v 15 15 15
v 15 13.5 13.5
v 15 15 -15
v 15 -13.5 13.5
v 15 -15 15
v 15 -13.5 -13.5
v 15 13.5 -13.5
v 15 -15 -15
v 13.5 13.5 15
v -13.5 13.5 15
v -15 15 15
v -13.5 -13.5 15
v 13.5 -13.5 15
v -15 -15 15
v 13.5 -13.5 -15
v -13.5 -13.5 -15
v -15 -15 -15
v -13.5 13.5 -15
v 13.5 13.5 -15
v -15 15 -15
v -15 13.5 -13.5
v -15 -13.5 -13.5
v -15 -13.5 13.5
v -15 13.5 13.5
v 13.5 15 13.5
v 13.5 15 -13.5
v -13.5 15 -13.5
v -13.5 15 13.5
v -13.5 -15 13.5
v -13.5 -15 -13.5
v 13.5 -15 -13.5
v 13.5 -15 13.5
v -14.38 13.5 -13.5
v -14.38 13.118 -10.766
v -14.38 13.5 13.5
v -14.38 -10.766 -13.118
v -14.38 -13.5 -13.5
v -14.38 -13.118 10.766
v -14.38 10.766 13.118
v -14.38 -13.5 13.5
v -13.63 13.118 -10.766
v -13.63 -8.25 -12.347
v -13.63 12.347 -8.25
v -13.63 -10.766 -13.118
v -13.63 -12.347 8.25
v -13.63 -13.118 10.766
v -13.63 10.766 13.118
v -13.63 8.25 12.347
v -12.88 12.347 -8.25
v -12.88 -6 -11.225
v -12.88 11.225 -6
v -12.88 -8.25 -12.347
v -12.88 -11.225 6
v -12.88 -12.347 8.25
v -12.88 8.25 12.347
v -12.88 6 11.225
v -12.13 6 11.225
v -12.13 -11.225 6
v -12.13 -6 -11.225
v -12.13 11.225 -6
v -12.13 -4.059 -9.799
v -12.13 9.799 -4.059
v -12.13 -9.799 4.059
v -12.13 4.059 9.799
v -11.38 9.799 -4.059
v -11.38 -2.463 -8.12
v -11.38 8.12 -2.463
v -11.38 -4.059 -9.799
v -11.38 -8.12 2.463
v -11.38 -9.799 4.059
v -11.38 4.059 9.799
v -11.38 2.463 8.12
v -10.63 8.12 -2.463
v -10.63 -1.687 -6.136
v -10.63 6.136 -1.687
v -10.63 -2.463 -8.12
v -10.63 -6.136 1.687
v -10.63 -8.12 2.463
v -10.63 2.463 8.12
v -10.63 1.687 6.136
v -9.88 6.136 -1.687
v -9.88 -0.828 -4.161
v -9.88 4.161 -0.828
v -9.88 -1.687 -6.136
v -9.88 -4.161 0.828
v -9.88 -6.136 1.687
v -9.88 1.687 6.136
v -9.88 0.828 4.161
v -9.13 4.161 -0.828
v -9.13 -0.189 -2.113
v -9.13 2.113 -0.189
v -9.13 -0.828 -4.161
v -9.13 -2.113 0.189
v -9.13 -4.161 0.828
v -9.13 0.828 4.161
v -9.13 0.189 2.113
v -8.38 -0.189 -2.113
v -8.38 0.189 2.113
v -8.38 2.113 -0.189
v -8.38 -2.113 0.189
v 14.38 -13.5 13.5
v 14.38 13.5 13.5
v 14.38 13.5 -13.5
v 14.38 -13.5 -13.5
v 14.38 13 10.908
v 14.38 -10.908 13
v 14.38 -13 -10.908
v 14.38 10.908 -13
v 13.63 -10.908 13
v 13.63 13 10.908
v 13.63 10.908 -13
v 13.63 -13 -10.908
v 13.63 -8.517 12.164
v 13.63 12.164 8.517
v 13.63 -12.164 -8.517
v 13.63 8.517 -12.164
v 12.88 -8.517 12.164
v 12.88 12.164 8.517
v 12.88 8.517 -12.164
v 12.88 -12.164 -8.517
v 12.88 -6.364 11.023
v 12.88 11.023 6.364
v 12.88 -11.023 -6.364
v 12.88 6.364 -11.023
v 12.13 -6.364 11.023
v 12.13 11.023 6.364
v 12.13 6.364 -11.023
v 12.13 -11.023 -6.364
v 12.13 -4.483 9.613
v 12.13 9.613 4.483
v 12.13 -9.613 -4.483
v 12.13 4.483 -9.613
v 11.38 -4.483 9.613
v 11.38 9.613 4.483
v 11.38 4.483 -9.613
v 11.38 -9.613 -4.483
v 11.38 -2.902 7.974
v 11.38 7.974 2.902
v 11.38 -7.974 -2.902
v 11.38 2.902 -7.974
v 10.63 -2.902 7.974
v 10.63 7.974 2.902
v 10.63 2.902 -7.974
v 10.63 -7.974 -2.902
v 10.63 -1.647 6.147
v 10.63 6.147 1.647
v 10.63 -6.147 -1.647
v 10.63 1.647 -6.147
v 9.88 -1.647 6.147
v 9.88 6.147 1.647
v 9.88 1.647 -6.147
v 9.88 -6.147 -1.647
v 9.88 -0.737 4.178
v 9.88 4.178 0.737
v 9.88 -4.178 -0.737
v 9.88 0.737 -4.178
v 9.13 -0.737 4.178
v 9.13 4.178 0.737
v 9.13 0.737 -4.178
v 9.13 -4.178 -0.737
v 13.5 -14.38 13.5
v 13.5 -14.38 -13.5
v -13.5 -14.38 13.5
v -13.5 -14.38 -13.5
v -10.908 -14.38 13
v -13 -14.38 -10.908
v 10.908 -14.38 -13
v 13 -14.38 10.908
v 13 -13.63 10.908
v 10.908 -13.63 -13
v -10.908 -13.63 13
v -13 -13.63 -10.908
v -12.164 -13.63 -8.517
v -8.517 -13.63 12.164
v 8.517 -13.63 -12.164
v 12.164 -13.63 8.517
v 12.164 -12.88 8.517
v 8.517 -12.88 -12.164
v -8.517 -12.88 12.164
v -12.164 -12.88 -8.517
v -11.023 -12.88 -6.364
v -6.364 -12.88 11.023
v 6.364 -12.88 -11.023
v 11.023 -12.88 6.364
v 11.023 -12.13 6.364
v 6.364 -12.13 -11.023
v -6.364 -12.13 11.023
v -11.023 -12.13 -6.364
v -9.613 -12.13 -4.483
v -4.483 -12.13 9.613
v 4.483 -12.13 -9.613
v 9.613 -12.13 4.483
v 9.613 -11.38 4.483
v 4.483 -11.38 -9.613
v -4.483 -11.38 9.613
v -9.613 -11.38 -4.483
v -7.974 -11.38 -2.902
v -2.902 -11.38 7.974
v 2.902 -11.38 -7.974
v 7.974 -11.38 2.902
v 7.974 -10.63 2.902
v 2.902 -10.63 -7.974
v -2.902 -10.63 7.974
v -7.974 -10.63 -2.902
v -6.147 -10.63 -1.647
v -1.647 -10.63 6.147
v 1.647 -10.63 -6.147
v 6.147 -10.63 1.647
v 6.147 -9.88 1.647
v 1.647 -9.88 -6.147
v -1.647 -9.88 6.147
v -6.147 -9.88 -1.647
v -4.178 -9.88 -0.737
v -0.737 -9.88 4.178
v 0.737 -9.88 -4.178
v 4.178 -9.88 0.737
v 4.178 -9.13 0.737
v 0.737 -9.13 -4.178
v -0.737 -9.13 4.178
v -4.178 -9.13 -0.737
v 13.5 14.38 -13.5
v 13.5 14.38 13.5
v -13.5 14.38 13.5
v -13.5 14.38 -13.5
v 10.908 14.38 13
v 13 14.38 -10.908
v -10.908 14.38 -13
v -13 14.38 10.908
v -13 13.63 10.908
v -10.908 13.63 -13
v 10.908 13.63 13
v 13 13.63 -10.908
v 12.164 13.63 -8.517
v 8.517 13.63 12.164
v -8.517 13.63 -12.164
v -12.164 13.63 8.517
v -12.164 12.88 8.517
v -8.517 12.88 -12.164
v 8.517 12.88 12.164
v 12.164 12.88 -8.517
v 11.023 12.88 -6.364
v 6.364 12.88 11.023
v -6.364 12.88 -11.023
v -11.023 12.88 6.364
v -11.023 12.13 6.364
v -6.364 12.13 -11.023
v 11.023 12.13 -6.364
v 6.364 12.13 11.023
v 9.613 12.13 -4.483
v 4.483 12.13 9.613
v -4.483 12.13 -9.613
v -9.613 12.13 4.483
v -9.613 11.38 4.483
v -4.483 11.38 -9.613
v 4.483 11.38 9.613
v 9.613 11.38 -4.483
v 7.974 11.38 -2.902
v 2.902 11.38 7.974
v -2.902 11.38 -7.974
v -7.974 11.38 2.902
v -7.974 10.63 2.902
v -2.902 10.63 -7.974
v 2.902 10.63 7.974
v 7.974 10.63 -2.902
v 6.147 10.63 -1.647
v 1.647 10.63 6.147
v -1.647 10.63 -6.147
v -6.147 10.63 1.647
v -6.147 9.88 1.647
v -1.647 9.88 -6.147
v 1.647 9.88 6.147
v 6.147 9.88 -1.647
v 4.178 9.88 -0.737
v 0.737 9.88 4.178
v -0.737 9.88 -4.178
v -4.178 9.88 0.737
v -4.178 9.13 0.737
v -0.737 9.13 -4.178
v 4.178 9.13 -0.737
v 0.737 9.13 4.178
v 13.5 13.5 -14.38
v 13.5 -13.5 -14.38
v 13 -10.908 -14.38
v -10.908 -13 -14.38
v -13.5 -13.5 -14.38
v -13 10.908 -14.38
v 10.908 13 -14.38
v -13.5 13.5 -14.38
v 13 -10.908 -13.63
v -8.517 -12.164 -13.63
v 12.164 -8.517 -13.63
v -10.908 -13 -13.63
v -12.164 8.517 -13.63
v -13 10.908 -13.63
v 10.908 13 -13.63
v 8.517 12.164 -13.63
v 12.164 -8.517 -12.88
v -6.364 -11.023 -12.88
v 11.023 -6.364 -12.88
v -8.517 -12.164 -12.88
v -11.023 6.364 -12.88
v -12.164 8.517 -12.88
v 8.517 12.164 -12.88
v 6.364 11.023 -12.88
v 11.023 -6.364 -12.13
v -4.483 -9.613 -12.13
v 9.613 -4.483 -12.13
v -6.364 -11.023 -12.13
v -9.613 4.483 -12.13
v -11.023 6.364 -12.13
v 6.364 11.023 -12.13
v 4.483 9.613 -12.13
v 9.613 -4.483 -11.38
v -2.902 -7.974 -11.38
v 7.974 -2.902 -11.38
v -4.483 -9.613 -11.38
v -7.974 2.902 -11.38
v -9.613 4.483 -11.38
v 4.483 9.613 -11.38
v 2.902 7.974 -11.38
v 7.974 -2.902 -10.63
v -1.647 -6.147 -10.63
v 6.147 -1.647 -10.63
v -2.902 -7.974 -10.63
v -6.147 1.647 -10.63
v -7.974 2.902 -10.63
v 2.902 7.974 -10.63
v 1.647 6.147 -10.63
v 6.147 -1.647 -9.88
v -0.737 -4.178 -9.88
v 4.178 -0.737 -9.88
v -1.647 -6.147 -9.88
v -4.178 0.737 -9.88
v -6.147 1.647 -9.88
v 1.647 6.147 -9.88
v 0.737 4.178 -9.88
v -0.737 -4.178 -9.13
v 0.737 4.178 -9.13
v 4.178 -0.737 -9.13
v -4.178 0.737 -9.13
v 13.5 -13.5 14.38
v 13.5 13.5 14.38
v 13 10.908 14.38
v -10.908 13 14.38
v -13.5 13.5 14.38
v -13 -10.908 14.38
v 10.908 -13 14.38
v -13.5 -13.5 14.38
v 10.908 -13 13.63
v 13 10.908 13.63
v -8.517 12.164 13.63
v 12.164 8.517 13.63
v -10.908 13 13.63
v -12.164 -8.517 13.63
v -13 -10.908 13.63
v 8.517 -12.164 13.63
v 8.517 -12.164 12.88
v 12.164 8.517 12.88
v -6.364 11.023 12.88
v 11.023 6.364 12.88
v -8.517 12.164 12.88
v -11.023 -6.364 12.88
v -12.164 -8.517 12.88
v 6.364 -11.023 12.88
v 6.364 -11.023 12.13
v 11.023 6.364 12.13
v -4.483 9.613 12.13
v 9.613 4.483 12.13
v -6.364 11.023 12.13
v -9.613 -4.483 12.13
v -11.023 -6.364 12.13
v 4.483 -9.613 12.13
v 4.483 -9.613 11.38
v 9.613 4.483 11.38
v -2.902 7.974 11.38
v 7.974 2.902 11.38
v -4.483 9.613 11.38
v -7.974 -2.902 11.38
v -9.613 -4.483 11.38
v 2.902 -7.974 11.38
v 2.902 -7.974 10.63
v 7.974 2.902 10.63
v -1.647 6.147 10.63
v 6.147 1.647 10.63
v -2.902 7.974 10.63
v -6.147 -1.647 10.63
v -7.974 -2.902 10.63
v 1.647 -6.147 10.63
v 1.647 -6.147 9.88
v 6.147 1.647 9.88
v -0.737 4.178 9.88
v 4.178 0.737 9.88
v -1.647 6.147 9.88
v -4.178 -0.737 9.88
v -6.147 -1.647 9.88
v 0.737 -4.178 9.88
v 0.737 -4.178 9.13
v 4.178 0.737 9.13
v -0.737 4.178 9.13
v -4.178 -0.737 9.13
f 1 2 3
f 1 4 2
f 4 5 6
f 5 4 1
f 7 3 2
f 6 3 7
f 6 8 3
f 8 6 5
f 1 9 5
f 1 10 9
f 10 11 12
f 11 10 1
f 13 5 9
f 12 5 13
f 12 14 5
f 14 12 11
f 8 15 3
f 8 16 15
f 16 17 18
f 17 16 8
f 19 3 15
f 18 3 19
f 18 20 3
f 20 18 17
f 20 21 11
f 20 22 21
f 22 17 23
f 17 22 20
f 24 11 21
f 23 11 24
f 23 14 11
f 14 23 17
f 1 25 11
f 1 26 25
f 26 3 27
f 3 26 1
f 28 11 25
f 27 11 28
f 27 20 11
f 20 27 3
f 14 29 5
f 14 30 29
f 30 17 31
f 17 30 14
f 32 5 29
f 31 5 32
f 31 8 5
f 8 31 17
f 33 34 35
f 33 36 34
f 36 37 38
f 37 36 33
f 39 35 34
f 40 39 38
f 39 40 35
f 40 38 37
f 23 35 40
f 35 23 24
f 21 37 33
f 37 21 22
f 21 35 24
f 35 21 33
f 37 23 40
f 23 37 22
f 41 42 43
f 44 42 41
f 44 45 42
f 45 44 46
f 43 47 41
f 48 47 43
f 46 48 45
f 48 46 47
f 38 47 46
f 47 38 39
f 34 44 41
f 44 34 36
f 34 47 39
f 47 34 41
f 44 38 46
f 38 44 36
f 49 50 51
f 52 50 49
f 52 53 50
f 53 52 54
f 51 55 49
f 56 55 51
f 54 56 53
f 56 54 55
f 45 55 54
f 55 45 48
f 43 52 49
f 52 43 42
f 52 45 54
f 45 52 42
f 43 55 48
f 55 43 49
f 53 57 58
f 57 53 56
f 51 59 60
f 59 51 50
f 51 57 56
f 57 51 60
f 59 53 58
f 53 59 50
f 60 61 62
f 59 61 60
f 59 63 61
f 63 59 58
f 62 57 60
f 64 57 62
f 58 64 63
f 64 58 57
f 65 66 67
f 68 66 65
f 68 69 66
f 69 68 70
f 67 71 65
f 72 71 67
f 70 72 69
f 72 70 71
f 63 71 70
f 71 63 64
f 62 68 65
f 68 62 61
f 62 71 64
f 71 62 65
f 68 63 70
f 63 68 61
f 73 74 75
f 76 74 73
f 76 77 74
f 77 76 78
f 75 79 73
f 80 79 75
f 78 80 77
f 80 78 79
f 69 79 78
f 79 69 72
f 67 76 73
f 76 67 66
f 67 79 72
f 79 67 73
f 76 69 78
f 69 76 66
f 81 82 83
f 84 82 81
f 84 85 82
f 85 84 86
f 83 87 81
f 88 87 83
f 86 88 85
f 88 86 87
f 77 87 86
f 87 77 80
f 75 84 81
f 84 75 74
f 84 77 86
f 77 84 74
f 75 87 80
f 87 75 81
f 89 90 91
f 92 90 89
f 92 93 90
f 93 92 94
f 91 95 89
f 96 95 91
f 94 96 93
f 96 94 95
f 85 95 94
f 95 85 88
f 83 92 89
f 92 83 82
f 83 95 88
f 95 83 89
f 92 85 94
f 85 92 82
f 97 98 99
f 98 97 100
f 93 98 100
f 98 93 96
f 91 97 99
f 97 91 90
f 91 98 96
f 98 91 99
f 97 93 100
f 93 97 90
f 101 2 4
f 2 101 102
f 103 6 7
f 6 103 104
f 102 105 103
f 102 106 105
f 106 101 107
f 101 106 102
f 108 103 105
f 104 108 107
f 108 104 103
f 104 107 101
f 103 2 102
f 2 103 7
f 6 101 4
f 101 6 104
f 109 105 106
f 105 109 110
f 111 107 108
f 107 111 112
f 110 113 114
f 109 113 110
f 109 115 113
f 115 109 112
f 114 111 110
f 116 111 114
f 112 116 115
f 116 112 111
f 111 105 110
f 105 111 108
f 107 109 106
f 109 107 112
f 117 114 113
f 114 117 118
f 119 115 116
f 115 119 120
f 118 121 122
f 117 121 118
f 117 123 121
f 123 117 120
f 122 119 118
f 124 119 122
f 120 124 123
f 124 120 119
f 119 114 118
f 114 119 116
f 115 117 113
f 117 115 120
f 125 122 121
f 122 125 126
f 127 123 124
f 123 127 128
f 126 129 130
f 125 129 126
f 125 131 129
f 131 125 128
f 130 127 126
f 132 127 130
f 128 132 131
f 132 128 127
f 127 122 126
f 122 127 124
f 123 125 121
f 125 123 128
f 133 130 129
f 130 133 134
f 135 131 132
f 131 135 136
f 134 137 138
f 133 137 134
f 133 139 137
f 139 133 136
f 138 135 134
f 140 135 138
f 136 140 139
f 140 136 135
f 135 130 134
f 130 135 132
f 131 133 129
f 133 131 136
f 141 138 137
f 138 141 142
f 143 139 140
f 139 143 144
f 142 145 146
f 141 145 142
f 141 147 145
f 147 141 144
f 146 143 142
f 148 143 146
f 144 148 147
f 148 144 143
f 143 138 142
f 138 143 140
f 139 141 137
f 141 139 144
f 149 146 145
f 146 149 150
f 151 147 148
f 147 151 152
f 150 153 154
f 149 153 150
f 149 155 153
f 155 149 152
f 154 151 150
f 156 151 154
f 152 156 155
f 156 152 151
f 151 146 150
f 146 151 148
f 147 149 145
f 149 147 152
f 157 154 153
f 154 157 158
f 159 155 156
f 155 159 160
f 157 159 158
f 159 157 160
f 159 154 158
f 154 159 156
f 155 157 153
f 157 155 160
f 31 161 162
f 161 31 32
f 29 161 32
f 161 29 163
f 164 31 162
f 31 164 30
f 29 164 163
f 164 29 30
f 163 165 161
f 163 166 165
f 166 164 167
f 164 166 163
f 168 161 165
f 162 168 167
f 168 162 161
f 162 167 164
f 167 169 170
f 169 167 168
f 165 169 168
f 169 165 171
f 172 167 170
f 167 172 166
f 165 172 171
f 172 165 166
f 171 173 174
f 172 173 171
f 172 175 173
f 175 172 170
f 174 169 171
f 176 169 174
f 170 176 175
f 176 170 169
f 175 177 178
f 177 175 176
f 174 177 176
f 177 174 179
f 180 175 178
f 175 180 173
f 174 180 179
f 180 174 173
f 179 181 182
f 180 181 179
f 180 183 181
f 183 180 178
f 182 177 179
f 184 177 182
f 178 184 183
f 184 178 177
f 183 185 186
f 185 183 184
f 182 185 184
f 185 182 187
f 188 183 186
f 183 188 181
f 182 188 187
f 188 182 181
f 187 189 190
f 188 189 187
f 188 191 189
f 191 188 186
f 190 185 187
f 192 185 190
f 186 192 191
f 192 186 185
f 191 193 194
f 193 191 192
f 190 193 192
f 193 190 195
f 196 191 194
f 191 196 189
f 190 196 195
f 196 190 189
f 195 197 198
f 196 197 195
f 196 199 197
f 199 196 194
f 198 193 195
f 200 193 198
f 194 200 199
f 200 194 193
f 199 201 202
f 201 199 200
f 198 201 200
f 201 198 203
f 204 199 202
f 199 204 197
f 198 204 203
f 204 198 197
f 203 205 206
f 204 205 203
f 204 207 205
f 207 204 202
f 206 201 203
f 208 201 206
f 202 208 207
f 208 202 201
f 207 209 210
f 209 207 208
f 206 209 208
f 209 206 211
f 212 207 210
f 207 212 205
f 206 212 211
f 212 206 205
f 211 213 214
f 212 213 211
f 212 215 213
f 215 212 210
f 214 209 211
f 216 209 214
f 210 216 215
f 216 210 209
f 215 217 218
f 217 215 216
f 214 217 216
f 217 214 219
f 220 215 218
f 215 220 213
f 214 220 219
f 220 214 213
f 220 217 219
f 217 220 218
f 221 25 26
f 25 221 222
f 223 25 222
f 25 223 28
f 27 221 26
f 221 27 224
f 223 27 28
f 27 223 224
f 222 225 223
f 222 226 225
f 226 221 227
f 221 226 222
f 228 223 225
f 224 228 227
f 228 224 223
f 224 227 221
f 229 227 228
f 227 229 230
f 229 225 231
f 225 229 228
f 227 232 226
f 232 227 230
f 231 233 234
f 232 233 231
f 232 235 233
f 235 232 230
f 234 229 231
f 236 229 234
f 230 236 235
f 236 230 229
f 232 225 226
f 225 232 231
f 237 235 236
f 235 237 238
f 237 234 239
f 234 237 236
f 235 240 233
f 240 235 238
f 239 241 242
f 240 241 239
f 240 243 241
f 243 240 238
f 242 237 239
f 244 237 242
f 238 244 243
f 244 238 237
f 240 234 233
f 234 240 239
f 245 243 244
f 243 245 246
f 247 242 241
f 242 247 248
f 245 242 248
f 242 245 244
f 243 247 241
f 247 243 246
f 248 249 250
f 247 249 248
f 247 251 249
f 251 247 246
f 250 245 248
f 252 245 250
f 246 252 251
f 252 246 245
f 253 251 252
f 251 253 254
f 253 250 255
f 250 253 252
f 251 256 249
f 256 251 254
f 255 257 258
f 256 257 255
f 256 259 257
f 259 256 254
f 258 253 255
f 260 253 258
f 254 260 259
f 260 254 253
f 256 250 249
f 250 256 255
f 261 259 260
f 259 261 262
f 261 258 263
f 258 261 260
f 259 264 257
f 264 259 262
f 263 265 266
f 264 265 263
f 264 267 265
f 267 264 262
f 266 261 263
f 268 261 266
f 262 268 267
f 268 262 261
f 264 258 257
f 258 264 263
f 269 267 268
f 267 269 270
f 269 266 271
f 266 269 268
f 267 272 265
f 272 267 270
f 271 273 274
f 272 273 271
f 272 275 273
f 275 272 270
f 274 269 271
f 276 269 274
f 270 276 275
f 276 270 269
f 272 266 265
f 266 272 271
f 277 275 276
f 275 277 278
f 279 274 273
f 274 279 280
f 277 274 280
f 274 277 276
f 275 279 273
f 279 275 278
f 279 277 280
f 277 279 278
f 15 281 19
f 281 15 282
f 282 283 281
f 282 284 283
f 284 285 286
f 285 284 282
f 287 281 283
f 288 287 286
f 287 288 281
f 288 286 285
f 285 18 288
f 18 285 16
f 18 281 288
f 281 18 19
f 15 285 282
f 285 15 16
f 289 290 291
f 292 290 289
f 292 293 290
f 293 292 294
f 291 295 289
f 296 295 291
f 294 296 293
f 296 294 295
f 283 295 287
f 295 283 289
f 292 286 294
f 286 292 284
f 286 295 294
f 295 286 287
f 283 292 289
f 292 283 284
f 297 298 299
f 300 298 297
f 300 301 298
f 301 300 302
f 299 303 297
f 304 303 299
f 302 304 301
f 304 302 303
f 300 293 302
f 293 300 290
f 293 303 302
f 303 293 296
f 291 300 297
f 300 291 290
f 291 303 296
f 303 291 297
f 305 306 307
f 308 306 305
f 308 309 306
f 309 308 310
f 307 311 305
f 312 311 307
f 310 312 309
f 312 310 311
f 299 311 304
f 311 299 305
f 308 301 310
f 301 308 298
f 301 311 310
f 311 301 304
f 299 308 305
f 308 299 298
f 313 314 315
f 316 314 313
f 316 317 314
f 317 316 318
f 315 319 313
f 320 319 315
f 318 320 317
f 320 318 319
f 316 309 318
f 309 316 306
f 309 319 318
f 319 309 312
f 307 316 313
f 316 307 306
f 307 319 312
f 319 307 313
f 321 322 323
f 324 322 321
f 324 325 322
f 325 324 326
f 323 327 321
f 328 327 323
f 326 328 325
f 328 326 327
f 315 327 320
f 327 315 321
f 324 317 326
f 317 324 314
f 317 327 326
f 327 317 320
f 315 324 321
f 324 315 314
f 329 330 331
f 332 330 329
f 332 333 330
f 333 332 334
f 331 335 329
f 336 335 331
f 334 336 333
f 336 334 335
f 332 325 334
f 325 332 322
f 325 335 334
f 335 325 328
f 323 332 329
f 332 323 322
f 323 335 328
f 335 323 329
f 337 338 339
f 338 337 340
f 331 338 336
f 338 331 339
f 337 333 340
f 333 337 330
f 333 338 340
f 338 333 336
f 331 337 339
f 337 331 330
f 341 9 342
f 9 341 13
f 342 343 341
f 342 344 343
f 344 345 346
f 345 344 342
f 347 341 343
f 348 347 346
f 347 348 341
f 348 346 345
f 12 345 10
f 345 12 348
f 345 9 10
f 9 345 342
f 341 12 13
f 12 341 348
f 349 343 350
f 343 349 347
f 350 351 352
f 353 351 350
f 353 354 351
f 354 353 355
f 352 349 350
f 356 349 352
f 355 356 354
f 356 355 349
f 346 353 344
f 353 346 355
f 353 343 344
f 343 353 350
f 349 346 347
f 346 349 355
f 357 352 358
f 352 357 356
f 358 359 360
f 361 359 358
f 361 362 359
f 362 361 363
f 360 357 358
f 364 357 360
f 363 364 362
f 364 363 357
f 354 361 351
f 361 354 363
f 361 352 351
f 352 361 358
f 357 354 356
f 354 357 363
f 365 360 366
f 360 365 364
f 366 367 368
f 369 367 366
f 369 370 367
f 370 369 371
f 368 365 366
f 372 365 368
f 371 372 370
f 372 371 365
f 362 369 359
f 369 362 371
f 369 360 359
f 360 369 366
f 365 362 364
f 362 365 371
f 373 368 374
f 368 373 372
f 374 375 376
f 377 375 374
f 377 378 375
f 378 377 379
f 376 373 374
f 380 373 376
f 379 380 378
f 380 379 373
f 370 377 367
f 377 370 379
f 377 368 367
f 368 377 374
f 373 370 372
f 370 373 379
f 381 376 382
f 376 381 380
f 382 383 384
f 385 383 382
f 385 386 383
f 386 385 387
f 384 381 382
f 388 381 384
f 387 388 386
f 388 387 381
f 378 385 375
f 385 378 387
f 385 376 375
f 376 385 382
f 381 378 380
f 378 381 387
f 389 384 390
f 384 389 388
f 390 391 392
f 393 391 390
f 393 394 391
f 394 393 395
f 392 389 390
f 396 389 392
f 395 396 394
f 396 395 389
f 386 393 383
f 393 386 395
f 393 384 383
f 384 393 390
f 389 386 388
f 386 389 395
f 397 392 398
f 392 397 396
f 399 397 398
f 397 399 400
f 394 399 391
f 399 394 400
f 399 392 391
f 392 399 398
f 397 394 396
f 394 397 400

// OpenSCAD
difference() {
    cube(30,center=true);
    //-x-axis
    translate([-14.76,0,0]) cube([0.76,27,27],center=true);
    translate([-14.01,0,0]) rotate([5.625,0,0]) cube([0.76,24,24],center=true);
    translate([-13.26,0,0]) rotate([11.25,0,0]) cube([0.76,21,21],center=true);
    translate([-12.51,0,0]) rotate([16.875,0,0]) cube([0.76,18,18],center=true);
    translate([-11.76,0,0]) rotate([22.5,0,0]) cube([0.76,15,15],center=true);
    translate([-11.01,0,0]) rotate([28.125,0,0]) cube([0.76,12,12],center=true);
    translate([-10.26,0,0]) rotate([29.625,0,0]) cube([0.76,9,9],center=true);
    translate([-9.51,0,0]) rotate([33.75,0,0]) cube([0.76,6,6],center=true);
    translate([-8.76,0,0]) rotate([39.875,0,0]) cube([0.76,3,3],center=true);
    //+x-axis
    translate([14.76,0,0]) cube([0.76,27,27],center=true);
    translate([14.01,0,0]) rotate([-5,0,0]) cube([0.76,24,24],center=true);
    translate([13.26,0,0]) rotate([-10,0,0]) cube([0.76,21,21],center=true);
    translate([12.51,0,0]) rotate([-15,0,0]) cube([0.76,18,18],center=true);
    translate([11.76,0,0]) rotate([-20,0,0]) cube([0.76,15,15],center=true);
    translate([11.01,0,0]) rotate([-25,0,0]) cube([0.76,12,12],center=true);
    translate([10.26,0,0]) rotate([-30,0,0]) cube([0.76,9,9],center=true);
    translate([9.51,0,0]) rotate([-35,0,0]) cube([0.76,6,6],center=true);
    //-y-axis
    translate([0,-14.76,0]) cube([27,0.76,27],center=true);
    translate([0,-14.01,0]) rotate([0,5,0]) cube([24,0.76,24],center=true);
    translate([0,-13.26,0]) rotate([0,10,0]) cube([21,0.76,21],center=true);
    translate([0,-12.51,0]) rotate([0,15,0]) cube([18,0.76,18],center=true);
    translate([0,-11.76,0]) rotate([0,20,0]) cube([15,0.76,15],center=true);
    translate([0,-11.01,0]) rotate([0,25,0]) cube([12,0.76,12],center=true);
    translate([0,-10.26,0]) rotate([0,30,0]) cube([9,0.76,9],center=true);
    translate([0,-9.51,0]) rotate([0,35,0]) cube([6,0.76,6],center=true);
    //+y-axis
    translate([0,14.76,0]) cube([27,0.76,27],center=true);
    translate([0,14.01,0]) rotate([0,-5,0]) cube([24,0.76,24],center=true);
    translate([0,13.26,0]) rotate([0,-10,0]) cube([21,0.76,21],center=true);
    translate([0,12.51,0]) rotate([0,-15,0]) cube([18,0.76,18],center=true);
    translate([0,11.76,0]) rotate([0,-20,0]) cube([15,0.76,15],center=true);
    translate([0,11.01,0]) rotate([0,-25,0]) cube([12,0.76,12],center=true);
    translate([0,10.26,0]) rotate([0,-30,0]) cube([9,0.76,9],center=true);
    translate([0,9.51,0]) rotate([0,-35,0]) cube([6,0.76,6],center=true);
    //-z-axis
    translate([0,0,-14.76]) cube([27,27,0.76],center=true);
    translate([0,0,-14.01]) rotate([0,0,5]) cube([24,24,0.76],center=true);
    translate([0,0,-13.26]) rotate([0,0,10]) cube([21,21,0.76],center=true);
    translate([0,0,-12.51]) rotate([0,0,15]) cube([18,18,0.76],center=true);
    translate([0,0,-11.76]) rotate([0,0,20]) cube([15,15,0.76],center=true);
    translate([0,0,-11.01]) rotate([0,0,25]) cube([12,12,0.76],center=true);
    translate([0,0,-10.26]) rotate([0,0,30]) cube([9,9,0.76],center=true);
    translate([0,0,-9.51]) rotate([0,0,35]) cube([6,6,0.76],center=true);
    //+z-axis
    translate([0,0,14.76]) cube([27,27,0.76],center=true);
    translate([0,0,14.01]) rotate([0,0,-5]) cube([24,24,0.76],center=true);
    translate([0,0,13.26]) rotate([0,0,-10]) cube([21,21,0.76],center=true);
    translate([0,0,12.51]) rotate([0,0,-15]) cube([18,18,0.76],center=true);
    translate([0,0,11.76]) rotate([0,0,-20]) cube([15,15,0.76],center=true);
    translate([0,0,11.01]) rotate([0,0,-25]) cube([12,12,0.76],center=true);
    translate([0,0,10.26]) rotate([0,0,-30]) cube([9,9,0.76],center=true);
    translate([0,0,9.51]) rotate([0,0,-35]) cube([6,6,0.76],center=true);
}
